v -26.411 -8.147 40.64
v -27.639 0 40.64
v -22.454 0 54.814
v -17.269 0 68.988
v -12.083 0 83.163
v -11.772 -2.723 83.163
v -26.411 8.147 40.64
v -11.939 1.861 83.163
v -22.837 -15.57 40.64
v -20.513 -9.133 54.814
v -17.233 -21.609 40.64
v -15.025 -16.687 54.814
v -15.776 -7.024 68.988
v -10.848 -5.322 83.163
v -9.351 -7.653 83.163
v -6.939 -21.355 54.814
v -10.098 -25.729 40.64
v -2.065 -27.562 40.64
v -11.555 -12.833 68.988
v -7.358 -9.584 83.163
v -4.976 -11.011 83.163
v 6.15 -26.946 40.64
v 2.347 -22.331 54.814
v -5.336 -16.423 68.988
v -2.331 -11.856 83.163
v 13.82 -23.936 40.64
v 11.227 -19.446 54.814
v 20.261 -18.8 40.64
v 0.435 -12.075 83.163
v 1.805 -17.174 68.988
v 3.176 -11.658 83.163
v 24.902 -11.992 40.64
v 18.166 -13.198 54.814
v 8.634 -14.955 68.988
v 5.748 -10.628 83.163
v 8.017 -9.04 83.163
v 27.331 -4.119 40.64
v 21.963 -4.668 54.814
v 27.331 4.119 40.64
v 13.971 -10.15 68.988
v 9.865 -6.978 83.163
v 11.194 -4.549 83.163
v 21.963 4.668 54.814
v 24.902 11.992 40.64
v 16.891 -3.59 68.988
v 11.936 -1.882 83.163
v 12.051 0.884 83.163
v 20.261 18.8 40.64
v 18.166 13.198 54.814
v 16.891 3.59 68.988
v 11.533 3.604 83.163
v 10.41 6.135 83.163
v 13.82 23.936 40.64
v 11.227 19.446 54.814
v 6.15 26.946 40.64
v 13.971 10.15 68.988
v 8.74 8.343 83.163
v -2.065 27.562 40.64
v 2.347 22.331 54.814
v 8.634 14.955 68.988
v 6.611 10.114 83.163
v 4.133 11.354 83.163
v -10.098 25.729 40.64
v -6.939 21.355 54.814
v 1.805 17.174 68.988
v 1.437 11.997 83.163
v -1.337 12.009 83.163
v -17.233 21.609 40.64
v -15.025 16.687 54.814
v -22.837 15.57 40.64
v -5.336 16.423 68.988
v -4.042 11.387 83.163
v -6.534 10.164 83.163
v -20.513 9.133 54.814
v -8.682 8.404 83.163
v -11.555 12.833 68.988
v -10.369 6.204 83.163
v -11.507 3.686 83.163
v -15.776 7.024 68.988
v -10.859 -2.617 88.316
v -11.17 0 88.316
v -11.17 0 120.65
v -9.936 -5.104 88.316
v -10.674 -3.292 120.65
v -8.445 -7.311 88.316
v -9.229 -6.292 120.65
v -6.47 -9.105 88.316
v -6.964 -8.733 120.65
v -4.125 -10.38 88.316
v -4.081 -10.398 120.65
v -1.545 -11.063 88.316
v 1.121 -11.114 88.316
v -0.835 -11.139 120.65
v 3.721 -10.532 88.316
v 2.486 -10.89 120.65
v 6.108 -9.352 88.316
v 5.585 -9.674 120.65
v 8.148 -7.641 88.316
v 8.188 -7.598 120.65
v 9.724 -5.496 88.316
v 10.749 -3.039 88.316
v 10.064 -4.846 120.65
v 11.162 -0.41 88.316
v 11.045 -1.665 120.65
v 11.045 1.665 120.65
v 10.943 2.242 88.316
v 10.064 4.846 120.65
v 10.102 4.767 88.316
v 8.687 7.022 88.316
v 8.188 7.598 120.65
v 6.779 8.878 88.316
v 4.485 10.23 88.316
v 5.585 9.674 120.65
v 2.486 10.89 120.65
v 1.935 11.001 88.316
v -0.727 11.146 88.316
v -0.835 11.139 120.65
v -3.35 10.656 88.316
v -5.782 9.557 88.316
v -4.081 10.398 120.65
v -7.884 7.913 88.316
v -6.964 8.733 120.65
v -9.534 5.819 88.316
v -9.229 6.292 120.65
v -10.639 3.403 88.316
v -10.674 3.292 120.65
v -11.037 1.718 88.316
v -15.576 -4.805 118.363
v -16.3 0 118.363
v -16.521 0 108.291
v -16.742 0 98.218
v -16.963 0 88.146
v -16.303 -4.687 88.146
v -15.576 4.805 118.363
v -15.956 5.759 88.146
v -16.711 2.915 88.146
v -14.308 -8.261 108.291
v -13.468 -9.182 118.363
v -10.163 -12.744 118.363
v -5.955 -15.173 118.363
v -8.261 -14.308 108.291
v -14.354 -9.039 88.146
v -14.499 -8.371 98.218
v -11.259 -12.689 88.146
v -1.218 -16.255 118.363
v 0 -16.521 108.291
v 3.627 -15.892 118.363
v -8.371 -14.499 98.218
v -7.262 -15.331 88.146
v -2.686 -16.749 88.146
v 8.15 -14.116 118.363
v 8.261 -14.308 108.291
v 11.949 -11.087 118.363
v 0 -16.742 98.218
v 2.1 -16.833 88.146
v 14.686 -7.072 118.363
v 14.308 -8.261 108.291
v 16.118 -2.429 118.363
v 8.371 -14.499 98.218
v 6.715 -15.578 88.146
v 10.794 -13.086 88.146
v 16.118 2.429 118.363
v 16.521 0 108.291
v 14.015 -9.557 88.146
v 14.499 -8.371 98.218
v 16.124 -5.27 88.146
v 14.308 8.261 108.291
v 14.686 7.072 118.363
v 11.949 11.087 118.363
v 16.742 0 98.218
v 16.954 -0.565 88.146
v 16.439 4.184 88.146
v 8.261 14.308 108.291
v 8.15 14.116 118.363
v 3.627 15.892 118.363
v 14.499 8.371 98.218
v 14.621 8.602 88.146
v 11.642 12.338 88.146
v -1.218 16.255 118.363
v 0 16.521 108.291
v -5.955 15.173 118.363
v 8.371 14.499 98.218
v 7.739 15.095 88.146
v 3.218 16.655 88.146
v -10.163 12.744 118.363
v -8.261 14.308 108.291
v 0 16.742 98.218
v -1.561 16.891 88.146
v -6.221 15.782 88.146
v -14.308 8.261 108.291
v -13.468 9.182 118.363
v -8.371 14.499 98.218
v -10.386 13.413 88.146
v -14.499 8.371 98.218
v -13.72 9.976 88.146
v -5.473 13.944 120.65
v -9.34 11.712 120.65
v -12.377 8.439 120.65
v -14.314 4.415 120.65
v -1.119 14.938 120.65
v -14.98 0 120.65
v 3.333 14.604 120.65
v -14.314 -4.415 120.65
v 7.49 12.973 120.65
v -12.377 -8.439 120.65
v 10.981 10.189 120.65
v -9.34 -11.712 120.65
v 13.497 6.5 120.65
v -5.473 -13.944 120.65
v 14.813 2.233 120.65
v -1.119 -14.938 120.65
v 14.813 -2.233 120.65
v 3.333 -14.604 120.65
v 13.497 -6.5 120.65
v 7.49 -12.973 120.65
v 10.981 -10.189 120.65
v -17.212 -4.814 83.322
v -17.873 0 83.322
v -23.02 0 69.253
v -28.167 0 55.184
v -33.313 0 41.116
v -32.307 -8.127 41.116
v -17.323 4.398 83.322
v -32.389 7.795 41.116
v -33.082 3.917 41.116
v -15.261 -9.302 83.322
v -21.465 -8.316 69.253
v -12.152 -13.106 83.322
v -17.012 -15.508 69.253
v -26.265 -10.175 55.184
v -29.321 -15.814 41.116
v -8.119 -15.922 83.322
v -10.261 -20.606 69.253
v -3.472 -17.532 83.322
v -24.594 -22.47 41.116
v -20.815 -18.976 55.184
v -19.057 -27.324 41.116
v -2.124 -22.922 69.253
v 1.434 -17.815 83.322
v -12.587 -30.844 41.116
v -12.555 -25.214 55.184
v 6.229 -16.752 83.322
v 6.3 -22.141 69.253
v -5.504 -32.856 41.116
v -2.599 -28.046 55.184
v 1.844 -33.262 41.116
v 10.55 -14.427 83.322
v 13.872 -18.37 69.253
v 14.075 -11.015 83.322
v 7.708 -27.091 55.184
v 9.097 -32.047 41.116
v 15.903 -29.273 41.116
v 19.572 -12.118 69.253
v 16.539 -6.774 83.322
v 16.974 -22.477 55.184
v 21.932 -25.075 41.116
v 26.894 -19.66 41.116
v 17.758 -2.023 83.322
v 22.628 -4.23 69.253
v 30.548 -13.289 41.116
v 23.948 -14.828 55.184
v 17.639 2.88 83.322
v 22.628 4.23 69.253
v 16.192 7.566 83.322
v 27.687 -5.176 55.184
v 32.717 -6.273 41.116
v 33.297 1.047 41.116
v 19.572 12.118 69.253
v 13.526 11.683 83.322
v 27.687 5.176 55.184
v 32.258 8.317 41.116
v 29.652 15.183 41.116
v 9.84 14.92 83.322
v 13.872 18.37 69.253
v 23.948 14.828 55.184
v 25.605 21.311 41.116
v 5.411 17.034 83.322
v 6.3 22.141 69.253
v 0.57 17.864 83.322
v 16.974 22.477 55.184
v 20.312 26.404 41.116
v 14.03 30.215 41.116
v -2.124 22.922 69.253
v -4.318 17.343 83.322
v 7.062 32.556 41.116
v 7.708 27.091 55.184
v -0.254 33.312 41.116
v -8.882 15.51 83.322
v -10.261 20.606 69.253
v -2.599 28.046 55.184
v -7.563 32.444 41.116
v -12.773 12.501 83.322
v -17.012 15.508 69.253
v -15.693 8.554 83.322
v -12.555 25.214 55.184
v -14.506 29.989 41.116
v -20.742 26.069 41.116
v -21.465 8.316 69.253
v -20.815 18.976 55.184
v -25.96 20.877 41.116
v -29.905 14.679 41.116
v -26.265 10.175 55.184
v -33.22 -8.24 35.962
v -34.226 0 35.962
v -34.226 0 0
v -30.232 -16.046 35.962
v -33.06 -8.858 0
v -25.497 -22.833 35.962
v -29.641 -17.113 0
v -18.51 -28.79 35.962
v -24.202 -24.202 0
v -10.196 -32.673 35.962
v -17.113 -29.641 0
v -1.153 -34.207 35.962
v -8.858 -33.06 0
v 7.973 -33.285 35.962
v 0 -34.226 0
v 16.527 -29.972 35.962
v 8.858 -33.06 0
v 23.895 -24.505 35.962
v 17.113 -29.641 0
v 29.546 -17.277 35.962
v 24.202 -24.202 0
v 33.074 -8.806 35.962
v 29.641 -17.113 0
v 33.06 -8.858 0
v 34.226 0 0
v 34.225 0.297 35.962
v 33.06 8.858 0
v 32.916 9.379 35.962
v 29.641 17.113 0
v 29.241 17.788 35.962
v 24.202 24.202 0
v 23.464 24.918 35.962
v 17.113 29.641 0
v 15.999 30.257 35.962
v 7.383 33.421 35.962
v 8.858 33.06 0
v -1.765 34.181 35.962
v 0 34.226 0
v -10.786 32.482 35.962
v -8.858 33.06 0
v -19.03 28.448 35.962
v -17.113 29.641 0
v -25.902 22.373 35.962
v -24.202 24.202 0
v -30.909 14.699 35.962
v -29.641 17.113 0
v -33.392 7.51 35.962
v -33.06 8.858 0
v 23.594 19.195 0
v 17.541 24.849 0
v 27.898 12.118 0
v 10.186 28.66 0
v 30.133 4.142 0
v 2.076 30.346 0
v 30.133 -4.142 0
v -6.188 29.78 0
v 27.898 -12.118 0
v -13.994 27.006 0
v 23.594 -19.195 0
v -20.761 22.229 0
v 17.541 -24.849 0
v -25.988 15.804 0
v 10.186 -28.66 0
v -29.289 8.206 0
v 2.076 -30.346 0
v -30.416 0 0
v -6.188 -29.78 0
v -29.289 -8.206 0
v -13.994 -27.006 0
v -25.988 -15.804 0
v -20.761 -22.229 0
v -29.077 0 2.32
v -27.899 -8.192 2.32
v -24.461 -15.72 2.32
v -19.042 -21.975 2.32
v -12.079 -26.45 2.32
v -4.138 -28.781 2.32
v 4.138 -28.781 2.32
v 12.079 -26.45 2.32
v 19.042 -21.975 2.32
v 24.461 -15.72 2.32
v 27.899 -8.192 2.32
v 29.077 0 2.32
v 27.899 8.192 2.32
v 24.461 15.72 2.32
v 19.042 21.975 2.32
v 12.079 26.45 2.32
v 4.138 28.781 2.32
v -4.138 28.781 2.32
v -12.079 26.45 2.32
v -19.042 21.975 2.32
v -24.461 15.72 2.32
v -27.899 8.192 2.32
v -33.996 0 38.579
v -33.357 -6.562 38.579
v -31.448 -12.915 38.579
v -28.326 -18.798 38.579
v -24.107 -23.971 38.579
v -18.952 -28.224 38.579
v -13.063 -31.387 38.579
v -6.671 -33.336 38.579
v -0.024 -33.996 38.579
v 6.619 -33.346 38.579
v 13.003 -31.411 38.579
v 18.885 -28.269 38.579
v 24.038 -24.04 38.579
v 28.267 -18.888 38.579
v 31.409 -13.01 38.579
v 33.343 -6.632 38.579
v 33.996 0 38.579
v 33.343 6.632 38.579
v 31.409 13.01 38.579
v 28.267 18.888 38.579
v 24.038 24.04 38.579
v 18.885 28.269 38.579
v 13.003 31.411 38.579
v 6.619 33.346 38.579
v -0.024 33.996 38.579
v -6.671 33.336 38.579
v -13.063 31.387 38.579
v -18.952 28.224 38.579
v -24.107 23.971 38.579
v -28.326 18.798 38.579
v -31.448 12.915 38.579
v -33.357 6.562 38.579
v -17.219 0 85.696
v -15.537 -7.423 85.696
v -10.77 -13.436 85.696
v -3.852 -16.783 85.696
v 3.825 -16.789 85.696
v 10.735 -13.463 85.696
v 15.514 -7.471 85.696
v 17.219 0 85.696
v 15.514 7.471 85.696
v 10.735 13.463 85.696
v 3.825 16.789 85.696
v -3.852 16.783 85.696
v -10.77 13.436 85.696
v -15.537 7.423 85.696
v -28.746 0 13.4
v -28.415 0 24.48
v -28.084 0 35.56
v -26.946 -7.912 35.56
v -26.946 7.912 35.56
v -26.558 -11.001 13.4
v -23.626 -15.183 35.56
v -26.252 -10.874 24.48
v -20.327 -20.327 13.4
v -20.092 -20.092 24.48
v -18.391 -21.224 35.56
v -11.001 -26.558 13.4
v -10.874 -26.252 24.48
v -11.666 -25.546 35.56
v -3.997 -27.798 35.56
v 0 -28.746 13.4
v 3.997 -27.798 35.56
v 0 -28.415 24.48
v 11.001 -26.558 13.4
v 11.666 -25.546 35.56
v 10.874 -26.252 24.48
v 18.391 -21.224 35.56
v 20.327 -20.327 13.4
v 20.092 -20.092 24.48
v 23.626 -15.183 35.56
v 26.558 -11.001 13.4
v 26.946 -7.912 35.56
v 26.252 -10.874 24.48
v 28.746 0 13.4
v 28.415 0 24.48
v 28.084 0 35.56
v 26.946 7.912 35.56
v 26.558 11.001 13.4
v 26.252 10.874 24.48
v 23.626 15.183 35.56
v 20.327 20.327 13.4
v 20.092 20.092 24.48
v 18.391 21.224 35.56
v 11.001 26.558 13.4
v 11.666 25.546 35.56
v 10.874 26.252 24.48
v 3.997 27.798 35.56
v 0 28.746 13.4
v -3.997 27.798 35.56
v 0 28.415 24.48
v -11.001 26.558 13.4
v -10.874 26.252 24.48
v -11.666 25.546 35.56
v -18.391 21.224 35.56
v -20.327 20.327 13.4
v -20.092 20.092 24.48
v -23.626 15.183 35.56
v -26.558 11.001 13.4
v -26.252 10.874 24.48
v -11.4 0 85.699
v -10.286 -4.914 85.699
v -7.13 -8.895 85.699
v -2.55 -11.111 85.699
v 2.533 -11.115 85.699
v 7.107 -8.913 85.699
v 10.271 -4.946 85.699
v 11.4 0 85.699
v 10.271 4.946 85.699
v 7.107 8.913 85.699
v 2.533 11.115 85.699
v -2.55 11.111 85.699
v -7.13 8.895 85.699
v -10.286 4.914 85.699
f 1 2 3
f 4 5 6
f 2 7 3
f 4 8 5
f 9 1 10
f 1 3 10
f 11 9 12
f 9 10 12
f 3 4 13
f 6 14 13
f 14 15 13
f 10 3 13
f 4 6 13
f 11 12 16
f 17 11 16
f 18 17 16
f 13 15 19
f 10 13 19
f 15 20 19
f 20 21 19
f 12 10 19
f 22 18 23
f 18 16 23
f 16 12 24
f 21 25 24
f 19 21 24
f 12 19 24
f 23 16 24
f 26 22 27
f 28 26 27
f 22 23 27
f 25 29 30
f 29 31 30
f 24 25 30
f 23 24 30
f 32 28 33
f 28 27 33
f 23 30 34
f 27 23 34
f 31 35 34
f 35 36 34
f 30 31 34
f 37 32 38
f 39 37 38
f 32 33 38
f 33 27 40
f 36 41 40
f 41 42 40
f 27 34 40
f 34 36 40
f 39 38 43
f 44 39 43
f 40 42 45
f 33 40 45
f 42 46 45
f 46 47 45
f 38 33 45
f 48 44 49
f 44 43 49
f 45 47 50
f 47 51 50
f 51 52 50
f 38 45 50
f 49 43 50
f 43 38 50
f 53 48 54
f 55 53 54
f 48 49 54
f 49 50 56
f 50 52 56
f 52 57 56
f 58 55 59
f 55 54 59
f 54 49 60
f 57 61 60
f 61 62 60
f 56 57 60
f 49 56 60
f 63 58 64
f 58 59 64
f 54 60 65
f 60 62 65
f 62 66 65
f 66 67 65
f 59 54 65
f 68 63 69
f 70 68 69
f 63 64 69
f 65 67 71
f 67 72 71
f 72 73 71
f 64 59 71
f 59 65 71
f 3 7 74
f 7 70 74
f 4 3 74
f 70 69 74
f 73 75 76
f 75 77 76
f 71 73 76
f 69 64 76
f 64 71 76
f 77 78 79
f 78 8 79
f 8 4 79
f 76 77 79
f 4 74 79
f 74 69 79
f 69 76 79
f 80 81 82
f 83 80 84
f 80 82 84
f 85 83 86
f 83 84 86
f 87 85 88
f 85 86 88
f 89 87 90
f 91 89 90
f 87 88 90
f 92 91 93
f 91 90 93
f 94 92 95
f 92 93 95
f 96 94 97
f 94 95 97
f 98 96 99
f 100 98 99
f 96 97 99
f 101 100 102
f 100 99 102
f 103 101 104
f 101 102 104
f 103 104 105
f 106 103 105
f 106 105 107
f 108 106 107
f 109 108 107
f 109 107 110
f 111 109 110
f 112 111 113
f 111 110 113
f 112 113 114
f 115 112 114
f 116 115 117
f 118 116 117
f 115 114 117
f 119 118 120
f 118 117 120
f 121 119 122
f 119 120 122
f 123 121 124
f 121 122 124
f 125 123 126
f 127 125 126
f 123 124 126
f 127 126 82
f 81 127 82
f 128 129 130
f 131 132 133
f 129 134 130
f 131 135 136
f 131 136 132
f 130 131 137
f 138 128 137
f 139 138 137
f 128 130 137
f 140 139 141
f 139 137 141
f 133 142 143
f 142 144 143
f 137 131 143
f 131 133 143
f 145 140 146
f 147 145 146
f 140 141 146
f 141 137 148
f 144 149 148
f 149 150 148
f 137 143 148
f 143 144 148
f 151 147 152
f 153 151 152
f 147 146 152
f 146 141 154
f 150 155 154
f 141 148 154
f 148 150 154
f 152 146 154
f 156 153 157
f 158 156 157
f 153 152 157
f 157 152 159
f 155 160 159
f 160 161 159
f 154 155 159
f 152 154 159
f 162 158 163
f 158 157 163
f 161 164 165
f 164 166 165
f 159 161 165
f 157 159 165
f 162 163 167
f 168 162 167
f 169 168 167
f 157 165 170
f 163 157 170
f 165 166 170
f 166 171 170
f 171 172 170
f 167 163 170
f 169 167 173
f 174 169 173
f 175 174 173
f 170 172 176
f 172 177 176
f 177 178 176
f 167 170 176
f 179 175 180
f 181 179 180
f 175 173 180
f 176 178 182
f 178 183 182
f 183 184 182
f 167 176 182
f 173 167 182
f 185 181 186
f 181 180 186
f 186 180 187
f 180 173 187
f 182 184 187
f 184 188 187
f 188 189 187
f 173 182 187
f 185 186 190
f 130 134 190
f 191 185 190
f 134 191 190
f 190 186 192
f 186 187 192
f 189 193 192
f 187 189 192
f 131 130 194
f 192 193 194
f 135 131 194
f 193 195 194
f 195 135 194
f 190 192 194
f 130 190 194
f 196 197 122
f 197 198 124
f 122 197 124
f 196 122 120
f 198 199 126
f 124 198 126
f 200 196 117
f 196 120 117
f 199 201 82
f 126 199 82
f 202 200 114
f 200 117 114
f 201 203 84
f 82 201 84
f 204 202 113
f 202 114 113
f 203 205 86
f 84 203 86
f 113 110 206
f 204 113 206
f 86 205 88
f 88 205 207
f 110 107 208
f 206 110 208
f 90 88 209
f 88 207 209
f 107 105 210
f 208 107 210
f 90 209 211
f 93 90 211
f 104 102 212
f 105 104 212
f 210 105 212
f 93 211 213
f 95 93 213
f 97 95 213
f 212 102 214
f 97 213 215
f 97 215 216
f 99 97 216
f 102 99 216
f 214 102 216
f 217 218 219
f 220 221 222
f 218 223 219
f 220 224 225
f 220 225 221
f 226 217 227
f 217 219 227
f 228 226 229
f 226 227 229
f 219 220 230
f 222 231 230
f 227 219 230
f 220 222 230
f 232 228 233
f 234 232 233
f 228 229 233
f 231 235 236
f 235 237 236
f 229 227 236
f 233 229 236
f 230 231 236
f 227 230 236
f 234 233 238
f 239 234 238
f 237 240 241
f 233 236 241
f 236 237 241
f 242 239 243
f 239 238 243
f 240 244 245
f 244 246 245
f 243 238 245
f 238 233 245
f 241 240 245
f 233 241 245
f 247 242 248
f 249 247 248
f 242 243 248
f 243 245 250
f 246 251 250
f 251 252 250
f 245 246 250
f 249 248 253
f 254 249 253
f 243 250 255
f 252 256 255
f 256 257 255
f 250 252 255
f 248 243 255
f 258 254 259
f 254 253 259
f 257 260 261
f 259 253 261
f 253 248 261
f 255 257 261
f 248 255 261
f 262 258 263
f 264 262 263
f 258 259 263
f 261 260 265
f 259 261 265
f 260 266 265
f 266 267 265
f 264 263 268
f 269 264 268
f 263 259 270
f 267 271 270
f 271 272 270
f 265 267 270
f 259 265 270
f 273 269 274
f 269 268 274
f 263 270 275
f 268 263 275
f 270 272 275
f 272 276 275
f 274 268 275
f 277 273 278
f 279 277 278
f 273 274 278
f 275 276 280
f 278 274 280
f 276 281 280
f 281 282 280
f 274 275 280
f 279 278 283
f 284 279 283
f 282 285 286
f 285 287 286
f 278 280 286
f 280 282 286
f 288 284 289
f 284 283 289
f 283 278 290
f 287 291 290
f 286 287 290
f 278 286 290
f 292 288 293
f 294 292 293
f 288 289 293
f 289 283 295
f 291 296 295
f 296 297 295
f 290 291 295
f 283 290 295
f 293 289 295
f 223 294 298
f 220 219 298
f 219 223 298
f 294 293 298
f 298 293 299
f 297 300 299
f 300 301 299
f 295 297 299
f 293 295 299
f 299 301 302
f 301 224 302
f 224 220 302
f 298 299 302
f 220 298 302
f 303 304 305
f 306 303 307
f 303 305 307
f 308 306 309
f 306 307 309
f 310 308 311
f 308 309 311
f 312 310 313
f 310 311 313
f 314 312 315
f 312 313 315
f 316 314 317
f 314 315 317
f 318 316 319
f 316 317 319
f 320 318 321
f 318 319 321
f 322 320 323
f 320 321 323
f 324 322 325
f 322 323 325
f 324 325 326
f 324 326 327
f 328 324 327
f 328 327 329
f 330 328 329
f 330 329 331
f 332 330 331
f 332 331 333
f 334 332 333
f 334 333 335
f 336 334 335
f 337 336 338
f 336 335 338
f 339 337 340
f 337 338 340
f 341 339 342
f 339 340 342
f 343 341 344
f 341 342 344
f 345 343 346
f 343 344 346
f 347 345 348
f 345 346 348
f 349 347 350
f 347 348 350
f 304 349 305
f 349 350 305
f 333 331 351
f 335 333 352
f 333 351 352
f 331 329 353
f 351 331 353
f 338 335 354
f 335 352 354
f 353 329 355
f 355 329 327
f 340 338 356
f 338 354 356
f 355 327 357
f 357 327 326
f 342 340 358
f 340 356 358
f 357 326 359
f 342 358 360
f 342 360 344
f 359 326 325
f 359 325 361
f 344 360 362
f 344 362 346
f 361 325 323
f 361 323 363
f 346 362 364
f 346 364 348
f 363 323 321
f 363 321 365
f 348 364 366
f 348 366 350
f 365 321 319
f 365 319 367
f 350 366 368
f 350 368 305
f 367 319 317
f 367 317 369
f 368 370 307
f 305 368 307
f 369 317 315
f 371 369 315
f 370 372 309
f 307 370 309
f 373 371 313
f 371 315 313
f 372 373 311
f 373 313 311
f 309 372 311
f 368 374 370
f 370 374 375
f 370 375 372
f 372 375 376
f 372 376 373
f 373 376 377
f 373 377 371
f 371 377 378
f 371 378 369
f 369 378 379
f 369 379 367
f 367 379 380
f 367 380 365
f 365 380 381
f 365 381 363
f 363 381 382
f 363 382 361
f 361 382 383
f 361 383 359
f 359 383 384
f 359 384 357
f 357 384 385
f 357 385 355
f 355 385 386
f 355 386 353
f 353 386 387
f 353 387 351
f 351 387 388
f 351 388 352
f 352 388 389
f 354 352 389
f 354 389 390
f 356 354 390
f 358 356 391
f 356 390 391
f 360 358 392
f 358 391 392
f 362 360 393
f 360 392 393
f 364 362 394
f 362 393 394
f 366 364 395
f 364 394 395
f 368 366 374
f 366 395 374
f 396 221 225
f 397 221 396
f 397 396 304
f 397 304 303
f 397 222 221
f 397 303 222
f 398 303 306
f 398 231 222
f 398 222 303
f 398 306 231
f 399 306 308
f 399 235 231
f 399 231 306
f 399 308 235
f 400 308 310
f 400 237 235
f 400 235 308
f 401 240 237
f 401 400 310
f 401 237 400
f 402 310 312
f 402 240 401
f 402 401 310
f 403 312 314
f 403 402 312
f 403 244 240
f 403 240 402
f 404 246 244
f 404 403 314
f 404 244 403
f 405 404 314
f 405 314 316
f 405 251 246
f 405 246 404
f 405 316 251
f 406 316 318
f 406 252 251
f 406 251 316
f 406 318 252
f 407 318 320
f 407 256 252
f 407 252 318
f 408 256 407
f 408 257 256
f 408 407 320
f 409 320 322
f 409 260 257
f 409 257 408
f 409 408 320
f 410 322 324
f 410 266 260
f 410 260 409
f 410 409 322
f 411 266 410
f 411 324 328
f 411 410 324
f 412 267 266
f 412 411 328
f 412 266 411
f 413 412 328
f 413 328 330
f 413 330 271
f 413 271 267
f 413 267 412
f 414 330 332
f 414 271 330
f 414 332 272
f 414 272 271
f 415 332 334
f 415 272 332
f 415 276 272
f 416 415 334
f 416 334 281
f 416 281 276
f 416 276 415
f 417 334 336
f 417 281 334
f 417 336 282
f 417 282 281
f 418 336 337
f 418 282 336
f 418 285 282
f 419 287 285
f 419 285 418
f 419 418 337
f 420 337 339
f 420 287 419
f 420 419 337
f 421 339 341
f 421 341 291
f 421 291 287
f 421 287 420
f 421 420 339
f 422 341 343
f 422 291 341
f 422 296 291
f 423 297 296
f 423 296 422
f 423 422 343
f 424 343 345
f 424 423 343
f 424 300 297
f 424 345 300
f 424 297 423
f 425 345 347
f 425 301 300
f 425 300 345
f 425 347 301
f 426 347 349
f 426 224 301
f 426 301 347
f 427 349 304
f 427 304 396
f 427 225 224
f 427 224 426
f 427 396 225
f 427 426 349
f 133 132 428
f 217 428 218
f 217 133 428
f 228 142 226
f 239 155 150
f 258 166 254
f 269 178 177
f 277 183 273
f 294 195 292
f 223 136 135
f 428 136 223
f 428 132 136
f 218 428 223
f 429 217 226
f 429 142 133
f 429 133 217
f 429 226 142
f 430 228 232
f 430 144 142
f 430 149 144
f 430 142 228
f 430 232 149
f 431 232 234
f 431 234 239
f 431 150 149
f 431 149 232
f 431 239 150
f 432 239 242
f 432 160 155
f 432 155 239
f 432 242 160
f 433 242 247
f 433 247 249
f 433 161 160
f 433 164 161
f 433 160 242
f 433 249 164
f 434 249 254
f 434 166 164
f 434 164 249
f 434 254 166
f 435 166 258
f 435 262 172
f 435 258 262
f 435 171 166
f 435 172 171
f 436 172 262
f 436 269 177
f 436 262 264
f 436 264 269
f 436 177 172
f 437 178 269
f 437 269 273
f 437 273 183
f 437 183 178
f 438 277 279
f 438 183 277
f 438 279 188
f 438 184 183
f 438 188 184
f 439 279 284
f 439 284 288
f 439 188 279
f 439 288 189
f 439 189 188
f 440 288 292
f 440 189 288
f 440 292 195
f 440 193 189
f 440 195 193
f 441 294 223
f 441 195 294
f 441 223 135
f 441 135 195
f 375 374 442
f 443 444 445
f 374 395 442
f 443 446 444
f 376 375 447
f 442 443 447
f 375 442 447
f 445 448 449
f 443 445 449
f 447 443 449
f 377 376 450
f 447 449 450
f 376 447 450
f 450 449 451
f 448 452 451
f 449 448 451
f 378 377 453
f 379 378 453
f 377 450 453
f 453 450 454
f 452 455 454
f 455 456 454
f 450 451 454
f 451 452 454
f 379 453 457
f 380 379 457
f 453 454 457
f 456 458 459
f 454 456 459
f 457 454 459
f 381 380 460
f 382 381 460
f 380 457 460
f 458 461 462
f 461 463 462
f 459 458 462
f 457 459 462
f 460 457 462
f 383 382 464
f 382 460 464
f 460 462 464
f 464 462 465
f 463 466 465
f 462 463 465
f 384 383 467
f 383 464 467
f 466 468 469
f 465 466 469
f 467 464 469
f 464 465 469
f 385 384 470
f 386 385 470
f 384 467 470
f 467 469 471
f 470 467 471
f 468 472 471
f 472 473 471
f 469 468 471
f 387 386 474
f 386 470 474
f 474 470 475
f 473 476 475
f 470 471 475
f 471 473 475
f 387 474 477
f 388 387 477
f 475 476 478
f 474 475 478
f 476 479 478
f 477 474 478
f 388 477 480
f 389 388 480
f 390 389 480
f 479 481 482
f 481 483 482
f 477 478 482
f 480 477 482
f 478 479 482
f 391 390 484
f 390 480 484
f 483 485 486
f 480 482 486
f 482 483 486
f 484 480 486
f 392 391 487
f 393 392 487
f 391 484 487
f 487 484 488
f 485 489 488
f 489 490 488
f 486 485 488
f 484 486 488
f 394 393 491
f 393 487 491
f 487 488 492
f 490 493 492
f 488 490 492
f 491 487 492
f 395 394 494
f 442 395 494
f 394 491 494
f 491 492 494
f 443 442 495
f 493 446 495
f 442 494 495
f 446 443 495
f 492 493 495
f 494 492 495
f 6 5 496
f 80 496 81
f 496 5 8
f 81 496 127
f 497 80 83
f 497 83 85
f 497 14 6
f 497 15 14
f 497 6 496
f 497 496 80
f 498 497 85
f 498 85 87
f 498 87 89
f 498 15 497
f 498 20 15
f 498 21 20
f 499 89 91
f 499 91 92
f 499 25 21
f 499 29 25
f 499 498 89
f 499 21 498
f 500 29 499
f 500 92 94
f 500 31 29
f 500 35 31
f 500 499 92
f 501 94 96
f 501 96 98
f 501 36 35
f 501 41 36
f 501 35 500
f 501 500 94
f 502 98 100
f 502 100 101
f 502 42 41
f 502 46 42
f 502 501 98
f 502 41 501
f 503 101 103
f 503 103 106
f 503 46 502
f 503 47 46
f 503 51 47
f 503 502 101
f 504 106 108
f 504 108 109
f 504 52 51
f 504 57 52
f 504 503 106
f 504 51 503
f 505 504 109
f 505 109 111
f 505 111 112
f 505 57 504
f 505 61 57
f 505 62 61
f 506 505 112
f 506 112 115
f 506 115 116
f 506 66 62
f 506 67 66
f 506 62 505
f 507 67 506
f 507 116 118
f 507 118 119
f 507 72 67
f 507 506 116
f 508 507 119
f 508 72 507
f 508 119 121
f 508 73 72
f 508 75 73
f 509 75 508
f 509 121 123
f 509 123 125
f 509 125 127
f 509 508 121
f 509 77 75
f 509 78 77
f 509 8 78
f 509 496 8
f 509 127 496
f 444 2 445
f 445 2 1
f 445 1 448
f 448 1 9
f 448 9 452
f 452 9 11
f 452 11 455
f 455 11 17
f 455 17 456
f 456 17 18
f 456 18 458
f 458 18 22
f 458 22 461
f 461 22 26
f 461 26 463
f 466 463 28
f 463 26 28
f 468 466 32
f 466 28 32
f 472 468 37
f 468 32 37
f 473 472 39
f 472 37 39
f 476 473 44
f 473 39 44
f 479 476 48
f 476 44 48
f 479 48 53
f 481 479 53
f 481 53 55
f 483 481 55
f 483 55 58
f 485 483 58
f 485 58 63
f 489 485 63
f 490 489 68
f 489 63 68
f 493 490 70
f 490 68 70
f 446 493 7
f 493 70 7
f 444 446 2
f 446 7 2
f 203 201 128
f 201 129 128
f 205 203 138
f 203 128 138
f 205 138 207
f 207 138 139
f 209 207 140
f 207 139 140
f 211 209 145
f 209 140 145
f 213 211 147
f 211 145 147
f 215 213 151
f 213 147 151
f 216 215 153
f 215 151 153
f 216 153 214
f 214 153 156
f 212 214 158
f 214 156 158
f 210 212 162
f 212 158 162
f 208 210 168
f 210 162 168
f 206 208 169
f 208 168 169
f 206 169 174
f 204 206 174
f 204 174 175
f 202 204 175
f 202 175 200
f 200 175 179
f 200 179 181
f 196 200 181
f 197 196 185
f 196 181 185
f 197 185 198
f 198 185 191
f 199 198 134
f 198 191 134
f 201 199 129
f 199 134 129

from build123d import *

# Parameters (mm, degrees)
F2_R = 15


with BuildPart() as f1:
    # F0 (on Front) → F1 (revolve)
    with BuildSketch(Plane.XZ):
        Polygon((-34.2265, 0), (-30.4165, 0), (-29.077178, 2.319773), (-28.083861, 35.56), (-27.639419, 40.64), (-11.17, 85.658427), (-11.17, 120.65), (-14.98, 120.65), (-16.300187, 118.363368), (-17.018, 85.658427), (-34.2265, 38.619754), align=None)
    revolve(axis=Axis((0, 0, 84.68134), (0, 0, 1)))

    # F2
    f2_edges = [f1.edges().sort_by_distance(p)[0] for p in [
        (34.2265, 0, 38.619754),
        (17.018, 0, 85.658427),
        (11.17, 0, 85.658427),
    ]]
    fillet(f2_edges, radius=F2_R)


solid = f1.part
